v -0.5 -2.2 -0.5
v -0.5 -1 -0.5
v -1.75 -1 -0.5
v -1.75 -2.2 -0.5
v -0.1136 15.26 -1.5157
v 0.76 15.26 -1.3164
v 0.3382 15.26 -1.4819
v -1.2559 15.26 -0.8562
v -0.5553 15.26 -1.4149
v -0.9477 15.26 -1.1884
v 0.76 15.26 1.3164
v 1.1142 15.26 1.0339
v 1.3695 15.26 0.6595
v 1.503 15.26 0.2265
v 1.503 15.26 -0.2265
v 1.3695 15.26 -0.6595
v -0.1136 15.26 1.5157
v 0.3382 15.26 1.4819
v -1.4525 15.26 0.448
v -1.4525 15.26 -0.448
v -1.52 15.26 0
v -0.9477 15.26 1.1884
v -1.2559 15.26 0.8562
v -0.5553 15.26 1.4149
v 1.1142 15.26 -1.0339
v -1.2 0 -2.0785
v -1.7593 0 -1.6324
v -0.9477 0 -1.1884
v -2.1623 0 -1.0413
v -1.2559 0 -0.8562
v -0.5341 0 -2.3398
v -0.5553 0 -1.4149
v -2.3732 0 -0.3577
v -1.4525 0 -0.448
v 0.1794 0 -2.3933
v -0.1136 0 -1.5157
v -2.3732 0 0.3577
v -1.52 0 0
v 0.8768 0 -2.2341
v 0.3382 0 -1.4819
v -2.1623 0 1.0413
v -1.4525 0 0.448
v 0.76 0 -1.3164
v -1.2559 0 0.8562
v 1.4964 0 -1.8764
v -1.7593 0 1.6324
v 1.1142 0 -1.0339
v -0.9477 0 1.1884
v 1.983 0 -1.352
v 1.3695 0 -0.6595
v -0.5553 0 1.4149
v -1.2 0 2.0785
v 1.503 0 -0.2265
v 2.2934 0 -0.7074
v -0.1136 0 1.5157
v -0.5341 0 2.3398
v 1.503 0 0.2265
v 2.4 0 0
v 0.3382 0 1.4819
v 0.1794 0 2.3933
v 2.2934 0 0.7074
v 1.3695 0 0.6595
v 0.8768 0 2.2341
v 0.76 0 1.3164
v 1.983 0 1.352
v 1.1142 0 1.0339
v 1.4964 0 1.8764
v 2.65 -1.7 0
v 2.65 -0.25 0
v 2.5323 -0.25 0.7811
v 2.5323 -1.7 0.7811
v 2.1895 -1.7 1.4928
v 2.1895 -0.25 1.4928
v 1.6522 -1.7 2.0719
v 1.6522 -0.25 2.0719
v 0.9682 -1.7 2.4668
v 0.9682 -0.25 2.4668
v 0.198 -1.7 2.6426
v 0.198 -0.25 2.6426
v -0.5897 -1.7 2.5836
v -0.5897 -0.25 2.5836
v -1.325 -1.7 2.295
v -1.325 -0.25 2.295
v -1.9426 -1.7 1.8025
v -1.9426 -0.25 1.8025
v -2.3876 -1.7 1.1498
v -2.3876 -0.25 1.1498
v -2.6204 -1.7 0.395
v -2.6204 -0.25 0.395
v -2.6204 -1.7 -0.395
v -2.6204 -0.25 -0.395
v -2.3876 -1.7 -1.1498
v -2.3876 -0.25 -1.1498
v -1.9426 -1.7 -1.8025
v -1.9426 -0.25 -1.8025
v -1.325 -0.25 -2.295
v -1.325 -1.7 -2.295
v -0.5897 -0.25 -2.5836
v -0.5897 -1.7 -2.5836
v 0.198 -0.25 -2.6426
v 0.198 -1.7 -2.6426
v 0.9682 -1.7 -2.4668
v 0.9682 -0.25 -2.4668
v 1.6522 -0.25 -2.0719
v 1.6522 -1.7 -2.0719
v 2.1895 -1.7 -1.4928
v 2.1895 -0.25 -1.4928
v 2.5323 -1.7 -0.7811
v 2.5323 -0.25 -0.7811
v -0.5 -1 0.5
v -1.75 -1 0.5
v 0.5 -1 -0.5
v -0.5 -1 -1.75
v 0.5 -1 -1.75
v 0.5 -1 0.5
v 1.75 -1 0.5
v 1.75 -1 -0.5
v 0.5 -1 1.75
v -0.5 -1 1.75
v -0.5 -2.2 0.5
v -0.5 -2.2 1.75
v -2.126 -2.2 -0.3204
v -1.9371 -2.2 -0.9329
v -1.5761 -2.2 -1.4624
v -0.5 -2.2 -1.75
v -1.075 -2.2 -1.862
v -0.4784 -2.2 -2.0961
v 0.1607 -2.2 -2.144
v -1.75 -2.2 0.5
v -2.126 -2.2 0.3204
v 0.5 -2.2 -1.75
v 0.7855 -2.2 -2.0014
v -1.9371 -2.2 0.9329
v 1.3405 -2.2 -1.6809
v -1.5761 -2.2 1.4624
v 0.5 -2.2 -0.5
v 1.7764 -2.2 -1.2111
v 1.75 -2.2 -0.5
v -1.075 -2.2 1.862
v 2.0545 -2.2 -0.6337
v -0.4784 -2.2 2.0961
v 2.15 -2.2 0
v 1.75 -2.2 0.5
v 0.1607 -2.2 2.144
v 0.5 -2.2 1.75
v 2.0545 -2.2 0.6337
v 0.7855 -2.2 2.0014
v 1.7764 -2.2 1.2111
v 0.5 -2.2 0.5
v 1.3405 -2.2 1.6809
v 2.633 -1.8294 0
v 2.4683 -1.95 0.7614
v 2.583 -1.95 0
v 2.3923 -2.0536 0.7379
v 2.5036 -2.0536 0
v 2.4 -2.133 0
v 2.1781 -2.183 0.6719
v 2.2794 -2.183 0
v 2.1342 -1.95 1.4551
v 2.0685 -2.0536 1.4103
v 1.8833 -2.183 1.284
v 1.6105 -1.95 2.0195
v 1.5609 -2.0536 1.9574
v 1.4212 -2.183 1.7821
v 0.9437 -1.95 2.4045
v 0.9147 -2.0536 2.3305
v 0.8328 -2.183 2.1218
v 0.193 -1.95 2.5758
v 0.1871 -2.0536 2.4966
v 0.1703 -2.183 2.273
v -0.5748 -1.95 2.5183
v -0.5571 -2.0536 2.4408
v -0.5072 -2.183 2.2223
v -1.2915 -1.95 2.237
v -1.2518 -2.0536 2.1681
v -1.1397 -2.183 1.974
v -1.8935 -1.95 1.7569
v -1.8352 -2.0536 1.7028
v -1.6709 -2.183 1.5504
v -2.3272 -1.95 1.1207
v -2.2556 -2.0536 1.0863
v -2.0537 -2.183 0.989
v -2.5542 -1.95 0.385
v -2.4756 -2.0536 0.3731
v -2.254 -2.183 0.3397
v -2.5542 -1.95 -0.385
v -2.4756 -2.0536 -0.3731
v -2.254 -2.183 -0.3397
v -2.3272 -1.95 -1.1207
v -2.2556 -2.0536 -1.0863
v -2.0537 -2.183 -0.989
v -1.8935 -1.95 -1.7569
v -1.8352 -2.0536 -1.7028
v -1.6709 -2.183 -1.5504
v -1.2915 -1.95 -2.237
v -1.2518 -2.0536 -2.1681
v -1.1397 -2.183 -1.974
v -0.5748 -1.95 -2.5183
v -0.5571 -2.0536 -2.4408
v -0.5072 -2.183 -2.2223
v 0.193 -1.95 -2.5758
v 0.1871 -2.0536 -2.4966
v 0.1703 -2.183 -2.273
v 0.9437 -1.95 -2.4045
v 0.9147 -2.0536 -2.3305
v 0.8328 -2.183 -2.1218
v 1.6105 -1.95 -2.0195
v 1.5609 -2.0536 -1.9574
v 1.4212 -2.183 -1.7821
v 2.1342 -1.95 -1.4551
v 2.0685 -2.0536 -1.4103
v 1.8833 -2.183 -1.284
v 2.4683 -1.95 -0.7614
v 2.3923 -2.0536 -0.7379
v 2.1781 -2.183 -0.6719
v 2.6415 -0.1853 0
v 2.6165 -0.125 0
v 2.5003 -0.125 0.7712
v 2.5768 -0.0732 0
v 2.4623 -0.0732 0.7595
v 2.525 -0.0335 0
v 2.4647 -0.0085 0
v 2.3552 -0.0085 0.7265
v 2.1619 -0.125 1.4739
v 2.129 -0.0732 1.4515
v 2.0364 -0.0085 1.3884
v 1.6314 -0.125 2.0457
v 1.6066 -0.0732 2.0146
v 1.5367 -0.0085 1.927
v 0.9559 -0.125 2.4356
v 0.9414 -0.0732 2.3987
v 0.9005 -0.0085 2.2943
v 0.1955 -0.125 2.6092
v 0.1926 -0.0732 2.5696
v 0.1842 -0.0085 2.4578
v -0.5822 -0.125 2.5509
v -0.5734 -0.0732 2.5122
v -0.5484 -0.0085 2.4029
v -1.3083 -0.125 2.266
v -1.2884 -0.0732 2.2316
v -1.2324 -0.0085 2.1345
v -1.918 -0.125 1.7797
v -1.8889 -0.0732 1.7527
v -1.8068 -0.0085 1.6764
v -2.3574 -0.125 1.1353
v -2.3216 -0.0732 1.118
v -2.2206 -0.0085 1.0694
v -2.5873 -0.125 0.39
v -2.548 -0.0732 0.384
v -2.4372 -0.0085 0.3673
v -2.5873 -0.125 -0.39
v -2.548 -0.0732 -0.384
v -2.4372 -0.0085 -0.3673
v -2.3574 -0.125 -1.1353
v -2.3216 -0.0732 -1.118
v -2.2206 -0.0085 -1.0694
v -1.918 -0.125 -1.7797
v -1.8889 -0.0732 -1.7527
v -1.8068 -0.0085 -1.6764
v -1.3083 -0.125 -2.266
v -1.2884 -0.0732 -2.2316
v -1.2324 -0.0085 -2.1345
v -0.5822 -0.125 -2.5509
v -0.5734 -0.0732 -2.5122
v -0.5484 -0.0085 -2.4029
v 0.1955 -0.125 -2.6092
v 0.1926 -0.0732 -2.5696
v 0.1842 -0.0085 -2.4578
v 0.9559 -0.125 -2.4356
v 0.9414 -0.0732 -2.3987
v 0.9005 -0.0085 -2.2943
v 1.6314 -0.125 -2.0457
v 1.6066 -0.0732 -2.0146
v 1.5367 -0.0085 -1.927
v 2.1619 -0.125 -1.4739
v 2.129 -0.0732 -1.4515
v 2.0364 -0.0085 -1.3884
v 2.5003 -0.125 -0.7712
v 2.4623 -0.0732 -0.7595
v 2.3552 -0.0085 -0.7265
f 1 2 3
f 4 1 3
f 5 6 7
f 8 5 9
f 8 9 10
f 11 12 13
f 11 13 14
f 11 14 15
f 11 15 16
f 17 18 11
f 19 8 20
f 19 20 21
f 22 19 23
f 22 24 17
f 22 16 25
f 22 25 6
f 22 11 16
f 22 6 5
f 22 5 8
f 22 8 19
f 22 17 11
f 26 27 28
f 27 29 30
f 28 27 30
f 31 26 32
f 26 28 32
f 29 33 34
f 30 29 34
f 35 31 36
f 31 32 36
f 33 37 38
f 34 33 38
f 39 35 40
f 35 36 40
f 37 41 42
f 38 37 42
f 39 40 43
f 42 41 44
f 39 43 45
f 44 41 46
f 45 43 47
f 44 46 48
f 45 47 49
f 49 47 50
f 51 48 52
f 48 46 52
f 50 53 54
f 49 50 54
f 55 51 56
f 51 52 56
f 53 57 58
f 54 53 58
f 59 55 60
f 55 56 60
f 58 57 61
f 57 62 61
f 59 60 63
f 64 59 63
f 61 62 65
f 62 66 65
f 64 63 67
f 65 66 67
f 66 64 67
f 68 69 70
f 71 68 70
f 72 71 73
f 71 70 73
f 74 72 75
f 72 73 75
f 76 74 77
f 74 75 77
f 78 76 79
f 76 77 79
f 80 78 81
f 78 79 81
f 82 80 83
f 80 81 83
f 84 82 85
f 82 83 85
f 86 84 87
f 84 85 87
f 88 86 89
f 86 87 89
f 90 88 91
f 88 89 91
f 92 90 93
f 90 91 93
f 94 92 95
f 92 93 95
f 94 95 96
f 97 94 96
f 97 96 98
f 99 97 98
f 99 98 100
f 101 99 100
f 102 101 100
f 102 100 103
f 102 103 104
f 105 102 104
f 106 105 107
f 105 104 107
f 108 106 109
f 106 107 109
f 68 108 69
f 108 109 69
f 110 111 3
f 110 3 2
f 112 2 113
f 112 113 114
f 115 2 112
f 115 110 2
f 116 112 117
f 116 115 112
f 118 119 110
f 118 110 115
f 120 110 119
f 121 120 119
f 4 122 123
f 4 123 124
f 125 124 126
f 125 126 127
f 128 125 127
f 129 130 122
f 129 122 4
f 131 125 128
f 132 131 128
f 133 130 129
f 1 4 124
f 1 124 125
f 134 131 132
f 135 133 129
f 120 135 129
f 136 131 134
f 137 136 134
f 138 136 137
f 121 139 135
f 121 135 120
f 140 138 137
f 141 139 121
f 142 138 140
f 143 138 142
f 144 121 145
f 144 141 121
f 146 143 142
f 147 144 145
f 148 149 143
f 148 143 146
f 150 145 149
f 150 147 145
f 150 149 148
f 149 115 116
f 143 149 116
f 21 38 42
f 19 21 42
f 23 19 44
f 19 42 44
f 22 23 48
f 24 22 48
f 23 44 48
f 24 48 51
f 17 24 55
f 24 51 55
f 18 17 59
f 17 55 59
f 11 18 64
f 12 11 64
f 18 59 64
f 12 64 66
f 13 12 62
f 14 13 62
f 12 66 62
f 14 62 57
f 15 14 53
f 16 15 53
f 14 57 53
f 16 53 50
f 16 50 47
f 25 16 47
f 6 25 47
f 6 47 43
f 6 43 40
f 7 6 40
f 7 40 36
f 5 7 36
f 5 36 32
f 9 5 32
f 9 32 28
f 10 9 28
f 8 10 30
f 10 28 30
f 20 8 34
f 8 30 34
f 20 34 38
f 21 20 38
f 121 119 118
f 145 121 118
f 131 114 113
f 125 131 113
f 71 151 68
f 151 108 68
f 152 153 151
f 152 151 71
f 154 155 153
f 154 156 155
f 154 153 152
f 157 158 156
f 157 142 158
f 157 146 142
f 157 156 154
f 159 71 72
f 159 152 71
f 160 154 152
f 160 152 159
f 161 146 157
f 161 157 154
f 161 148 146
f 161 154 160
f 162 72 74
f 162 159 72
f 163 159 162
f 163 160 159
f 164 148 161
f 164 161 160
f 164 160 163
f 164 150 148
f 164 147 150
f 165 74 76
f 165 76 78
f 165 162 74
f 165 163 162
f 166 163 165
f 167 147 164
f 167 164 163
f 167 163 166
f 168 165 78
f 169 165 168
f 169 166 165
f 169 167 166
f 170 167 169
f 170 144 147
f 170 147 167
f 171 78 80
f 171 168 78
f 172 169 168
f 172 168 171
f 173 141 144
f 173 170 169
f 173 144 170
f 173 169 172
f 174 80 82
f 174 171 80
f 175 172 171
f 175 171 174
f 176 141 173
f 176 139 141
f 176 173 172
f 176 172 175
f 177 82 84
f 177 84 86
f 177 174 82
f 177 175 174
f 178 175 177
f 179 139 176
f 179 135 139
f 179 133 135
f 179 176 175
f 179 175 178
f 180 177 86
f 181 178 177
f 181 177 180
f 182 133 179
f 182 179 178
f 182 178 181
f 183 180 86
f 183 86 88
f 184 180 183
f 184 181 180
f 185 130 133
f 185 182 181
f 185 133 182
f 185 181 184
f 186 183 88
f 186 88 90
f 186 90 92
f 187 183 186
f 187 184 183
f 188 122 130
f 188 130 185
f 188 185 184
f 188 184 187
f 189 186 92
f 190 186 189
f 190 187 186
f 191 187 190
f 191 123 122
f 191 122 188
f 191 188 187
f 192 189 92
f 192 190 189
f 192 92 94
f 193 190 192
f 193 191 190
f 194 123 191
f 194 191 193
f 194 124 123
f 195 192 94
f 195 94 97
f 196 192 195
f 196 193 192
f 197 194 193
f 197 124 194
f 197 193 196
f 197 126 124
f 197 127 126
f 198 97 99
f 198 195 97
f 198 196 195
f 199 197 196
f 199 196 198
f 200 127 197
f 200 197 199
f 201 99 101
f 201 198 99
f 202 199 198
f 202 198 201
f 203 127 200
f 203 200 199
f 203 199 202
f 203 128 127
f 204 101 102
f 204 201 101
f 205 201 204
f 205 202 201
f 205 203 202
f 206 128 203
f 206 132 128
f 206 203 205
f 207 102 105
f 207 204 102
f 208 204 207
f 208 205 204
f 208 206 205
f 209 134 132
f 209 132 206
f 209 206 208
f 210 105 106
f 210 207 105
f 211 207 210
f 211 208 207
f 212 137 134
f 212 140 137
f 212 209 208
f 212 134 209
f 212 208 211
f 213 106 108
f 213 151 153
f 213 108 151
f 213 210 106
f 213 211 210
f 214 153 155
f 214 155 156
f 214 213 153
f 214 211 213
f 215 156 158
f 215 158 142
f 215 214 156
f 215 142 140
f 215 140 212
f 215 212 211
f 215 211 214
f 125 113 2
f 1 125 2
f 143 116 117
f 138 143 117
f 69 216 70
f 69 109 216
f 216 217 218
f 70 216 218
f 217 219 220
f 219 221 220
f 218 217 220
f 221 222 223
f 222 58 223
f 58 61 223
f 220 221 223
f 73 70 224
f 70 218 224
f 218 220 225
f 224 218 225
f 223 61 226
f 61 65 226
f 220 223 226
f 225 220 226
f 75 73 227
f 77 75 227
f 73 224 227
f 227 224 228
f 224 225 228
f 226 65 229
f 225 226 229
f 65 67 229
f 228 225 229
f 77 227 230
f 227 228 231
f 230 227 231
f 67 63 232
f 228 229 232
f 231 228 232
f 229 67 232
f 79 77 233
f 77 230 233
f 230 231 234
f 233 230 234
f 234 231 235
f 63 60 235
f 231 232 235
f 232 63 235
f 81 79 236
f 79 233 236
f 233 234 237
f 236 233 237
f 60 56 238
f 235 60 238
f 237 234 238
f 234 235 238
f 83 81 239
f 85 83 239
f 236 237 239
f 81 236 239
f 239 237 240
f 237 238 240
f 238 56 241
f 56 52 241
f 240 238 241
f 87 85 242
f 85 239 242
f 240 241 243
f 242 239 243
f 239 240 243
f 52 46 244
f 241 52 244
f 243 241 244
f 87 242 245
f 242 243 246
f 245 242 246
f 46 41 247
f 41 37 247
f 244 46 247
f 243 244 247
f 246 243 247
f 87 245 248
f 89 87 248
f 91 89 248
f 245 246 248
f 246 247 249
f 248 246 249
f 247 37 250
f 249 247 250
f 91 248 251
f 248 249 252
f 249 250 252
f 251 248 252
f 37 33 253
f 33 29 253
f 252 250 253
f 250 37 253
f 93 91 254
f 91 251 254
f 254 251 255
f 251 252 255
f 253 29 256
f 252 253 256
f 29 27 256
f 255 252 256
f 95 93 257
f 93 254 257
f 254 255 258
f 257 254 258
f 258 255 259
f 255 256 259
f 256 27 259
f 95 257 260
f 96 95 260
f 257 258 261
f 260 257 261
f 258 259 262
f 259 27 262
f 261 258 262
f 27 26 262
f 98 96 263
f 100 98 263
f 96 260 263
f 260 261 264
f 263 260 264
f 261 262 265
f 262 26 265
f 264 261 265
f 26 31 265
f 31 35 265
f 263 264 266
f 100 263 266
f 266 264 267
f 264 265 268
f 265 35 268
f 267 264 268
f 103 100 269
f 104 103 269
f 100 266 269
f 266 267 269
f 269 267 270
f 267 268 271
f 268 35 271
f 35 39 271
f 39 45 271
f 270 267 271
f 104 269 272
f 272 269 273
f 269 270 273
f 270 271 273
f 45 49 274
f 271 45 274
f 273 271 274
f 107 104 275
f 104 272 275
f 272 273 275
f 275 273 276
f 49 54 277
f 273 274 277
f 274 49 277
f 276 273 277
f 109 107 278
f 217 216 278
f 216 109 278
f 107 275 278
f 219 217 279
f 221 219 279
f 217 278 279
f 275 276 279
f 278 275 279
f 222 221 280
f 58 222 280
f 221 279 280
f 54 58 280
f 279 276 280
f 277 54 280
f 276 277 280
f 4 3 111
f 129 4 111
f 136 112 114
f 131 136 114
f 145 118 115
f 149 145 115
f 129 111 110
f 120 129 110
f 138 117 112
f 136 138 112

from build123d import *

# Parameters (mm, degrees)
F0_R     = 2.65
F1_DEPTH = 2.2
F0_W     = 1
F0_H     = 1.25
F0_W_2   = 1.25
F0_H_2   = 1
F2_DEPTH = 1
F3_R     = 0.5
F4_R     = 0.25
F5_R     = 1.52
F6_DEPTH = 15.26


with BuildPart() as f1:
    # F0 (on Front) → F1 (new body)
    with BuildSketch(Plane.XZ):
        Circle(F0_R)
        Polygon((0.5, -0.5), (0.5, -1.75), (-0.5, -1.75), (-0.5, -0.5), (-1.75, -0.5), (-1.75, 0.5), (-0.5, 0.5), (-0.5, 1.75), (0.5, 1.75), (0.5, 0.5), (1.75, 0.5), (1.75, -0.5), align=None, mode=Mode.SUBTRACT)
    extrude(amount=F1_DEPTH)

    # F0 (on Front) → F2 (join)
    with BuildSketch(Plane.XZ):
        with Locations((0, 1.125)):
            Rectangle(F0_W, F0_H)
        with Locations((1.125, 0)):
            Rectangle(F0_W_2, F0_H_2)
        with Locations((-1.125, 0)):
            Rectangle(F0_W_2, F0_H_2)
        Rectangle(F0_W, F0_H_2)
        with Locations((0, -1.125)):
            Rectangle(F0_W, F0_H)
    extrude(amount=F2_DEPTH)

    # F3
    f3_edges = [f1.edges().sort_by_distance(p)[0] for p in [
        (-2.65, -2.2, 0),
    ]]
    fillet(f3_edges, radius=F3_R)

    # F4
    f4_edges = [f1.edges().sort_by_distance(p)[0] for p in [
        (-2.65, 0, 0),
    ]]
    fillet(f4_edges, radius=F4_R)

    # F5 (on face) → F6 (join)
    with BuildSketch(Plane(origin=(0, 0, 0), x_dir=(-1, 0, 0), z_dir=(0, 1, 0))):
        Circle(F5_R)
    extrude(amount=F6_DEPTH)


solid = f1.part
